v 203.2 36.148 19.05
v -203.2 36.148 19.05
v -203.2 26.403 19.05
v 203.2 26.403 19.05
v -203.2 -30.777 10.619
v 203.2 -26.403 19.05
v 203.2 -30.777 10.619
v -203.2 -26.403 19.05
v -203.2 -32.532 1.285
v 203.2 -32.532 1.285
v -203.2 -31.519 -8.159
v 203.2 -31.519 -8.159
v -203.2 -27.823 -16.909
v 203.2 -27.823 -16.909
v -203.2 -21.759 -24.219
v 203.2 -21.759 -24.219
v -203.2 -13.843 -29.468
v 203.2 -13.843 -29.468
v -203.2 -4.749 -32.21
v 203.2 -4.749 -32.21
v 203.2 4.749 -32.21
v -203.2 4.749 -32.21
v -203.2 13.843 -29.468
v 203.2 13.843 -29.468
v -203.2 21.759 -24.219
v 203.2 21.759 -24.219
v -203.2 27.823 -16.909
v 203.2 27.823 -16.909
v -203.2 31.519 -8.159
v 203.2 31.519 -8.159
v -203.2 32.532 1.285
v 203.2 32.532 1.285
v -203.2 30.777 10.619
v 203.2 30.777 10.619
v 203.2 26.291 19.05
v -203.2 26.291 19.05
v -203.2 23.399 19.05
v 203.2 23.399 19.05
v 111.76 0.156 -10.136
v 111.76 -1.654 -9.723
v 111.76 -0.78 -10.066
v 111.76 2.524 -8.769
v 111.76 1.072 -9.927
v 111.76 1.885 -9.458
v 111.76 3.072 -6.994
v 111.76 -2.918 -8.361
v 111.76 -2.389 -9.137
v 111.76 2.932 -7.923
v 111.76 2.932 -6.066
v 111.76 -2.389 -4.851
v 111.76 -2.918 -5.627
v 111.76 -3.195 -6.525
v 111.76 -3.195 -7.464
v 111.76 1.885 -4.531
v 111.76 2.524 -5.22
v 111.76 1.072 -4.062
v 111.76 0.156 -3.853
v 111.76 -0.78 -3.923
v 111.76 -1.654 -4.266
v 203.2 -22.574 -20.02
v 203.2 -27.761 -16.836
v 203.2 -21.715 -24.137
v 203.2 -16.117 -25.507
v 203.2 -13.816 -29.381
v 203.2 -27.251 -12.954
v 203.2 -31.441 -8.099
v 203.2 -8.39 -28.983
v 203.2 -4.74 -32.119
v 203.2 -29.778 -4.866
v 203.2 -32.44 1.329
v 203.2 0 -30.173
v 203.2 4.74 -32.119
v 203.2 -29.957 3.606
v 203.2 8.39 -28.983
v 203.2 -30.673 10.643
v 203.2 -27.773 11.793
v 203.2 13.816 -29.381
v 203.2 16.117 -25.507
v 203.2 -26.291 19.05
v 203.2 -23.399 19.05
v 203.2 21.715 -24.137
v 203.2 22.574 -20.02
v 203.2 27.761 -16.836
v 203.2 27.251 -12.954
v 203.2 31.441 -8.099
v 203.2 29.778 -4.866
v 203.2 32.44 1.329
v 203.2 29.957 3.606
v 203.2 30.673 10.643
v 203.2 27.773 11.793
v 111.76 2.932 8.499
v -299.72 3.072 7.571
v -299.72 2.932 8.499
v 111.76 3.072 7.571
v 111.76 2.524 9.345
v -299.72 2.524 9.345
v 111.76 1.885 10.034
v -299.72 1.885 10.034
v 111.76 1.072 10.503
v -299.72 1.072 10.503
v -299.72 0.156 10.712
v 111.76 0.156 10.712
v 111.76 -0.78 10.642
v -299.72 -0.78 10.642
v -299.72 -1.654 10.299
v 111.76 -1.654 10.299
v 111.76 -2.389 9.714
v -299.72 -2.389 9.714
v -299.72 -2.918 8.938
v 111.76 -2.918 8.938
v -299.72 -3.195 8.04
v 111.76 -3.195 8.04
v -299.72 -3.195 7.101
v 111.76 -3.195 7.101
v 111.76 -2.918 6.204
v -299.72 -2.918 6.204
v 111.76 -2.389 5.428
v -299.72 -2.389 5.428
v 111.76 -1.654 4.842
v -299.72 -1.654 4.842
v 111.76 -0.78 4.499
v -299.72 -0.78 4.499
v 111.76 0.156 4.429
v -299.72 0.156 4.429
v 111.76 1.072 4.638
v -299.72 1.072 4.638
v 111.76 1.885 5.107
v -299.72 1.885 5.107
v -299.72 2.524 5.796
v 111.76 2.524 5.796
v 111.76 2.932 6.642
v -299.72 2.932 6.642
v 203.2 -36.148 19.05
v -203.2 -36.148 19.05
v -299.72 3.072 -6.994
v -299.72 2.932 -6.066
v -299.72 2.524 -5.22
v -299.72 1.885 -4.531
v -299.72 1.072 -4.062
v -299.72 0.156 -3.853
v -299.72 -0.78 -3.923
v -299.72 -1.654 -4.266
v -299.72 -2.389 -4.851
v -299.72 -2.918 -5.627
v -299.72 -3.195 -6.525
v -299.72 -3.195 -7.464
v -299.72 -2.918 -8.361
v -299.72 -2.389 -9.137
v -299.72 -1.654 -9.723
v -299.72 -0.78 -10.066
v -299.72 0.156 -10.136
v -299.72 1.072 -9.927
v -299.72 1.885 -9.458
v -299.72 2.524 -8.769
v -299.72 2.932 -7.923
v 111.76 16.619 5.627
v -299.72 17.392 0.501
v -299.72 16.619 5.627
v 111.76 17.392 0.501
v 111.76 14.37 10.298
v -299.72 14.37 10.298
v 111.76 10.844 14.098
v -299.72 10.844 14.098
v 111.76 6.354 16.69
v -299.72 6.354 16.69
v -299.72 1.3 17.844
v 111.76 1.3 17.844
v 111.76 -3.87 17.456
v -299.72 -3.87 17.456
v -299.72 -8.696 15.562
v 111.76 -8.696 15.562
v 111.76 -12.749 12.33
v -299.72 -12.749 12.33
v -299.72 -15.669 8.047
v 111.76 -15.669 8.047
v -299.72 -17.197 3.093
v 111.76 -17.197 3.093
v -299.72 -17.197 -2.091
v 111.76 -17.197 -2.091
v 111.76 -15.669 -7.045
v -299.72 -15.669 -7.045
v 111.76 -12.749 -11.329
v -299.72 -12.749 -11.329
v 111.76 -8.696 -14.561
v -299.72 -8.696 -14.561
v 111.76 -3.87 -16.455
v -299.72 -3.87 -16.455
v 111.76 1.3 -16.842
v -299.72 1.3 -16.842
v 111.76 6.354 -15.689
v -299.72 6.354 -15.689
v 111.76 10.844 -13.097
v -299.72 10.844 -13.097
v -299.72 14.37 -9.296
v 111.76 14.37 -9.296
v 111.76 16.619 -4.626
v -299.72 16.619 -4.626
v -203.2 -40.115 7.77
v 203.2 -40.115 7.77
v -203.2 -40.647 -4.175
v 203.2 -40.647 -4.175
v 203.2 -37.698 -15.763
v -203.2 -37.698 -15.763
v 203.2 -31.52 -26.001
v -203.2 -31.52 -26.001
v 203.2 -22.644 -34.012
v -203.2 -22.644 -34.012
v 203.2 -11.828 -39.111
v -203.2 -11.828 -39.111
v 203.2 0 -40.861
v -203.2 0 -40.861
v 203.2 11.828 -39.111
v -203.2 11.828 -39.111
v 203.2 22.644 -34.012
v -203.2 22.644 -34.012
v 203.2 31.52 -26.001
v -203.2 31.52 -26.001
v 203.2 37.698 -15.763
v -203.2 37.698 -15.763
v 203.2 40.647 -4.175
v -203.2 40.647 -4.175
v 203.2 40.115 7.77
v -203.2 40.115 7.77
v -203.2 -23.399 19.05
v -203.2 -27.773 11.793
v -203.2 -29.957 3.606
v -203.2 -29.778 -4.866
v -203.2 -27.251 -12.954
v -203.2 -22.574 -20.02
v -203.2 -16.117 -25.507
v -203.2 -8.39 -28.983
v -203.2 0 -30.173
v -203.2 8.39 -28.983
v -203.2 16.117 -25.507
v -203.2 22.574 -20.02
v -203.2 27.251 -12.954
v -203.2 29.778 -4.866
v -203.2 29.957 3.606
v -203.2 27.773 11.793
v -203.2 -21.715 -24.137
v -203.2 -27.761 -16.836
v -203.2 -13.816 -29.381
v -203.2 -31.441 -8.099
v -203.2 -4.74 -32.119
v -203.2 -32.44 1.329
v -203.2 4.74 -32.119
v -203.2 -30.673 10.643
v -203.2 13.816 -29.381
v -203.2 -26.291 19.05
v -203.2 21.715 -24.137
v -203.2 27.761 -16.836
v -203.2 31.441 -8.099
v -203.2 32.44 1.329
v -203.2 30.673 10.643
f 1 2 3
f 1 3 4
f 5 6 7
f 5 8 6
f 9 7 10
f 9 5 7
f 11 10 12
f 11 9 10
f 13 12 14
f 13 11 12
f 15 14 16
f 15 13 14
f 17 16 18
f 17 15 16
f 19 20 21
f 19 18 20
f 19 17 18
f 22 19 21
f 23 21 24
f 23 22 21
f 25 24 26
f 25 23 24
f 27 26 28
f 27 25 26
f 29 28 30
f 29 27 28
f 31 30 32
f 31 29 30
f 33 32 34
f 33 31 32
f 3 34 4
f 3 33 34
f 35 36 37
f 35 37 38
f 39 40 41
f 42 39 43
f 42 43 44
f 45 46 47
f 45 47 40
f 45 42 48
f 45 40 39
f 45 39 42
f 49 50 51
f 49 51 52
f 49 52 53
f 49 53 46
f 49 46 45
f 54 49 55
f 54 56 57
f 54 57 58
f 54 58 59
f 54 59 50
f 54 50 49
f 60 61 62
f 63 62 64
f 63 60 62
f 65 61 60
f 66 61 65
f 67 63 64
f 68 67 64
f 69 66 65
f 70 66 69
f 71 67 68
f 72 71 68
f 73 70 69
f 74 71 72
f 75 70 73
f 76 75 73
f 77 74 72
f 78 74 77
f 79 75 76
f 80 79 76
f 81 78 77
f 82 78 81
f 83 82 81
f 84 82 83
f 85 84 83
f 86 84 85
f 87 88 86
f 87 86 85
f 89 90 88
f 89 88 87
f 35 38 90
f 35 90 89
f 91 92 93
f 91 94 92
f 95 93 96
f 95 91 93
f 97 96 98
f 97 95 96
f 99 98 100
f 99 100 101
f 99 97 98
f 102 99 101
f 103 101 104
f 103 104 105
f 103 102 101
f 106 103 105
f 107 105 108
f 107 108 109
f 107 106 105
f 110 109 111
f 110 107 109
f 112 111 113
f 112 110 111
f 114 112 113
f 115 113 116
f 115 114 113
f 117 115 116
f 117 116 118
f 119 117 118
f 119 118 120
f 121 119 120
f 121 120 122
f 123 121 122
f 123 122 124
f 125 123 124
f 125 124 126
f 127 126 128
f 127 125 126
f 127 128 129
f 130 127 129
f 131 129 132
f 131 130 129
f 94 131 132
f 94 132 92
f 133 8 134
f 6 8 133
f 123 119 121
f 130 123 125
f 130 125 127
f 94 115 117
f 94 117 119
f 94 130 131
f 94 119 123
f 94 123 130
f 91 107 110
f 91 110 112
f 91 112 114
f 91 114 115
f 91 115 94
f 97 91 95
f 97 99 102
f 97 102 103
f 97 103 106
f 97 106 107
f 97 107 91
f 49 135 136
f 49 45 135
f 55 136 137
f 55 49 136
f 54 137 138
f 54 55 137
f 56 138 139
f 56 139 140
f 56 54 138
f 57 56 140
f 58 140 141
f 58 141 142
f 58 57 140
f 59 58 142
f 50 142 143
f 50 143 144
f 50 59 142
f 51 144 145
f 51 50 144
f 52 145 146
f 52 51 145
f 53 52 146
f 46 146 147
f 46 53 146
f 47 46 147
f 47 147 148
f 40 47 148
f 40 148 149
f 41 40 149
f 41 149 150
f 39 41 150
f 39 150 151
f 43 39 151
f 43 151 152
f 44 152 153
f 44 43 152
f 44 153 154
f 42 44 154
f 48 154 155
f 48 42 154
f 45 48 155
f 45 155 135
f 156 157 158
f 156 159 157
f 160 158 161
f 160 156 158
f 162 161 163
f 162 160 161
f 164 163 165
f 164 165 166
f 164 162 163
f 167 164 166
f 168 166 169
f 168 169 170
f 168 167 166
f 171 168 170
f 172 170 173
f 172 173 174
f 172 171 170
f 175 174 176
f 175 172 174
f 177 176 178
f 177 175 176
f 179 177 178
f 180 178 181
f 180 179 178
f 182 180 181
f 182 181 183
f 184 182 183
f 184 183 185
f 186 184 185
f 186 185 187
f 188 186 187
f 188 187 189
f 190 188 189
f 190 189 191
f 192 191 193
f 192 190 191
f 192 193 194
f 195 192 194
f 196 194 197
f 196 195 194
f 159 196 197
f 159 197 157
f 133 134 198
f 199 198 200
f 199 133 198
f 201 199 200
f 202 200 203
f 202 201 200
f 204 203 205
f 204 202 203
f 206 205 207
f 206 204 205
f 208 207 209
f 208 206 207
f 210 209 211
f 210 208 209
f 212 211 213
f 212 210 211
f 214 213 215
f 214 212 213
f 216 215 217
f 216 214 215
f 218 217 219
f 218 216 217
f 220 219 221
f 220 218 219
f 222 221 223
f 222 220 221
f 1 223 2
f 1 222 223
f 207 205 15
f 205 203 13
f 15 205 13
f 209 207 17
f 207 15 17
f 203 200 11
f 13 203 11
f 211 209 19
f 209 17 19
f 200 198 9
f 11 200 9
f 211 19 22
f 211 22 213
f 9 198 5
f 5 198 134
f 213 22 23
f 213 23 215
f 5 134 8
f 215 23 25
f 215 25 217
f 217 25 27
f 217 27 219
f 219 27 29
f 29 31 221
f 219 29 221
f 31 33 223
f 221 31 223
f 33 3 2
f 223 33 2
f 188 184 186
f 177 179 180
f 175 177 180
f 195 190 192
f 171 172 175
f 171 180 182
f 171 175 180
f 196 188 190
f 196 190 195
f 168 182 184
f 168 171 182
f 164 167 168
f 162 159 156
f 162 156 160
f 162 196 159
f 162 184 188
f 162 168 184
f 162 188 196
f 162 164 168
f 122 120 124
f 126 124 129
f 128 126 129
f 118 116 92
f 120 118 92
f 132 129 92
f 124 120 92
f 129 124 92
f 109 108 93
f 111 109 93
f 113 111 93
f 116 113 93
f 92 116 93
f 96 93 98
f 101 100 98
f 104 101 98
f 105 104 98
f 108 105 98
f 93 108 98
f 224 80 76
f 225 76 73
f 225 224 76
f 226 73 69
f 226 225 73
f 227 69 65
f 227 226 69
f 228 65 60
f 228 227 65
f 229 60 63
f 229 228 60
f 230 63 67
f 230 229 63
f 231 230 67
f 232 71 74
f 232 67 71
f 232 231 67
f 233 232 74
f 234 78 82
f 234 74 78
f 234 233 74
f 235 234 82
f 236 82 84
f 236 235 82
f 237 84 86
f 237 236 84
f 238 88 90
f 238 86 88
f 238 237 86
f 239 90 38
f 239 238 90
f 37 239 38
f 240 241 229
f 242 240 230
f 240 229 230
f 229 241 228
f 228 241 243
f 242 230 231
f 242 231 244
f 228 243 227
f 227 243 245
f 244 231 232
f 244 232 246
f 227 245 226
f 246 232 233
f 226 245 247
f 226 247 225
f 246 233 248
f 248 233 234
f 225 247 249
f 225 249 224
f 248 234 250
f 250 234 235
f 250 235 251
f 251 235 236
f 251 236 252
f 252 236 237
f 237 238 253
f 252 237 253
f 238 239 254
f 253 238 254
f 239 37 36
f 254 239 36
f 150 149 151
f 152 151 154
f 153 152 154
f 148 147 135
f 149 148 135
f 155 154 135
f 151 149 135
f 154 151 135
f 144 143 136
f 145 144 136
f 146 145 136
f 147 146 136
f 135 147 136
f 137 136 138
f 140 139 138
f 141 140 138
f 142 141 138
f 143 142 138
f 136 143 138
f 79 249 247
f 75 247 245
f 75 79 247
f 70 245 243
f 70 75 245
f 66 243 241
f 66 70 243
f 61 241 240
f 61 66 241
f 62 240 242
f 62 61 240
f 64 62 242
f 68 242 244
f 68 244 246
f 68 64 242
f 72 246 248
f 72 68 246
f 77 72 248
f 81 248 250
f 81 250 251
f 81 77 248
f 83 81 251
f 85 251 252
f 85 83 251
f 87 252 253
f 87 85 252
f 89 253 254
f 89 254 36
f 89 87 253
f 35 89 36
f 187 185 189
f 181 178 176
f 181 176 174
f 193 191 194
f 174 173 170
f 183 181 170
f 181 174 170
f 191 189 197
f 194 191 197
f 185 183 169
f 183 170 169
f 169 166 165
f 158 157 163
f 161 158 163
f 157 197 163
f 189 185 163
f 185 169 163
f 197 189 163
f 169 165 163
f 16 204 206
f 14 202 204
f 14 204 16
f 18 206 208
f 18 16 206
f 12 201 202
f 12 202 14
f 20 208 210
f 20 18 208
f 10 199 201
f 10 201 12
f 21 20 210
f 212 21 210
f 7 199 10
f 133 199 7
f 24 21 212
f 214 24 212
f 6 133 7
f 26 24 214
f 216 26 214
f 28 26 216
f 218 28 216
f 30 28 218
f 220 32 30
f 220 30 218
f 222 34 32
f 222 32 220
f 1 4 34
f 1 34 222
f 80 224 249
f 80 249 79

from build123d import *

# Parameters (mm, degrees)
F0_R           = 32.467339
F0_R_2         = 30.172731
F1_DEPTH       = 203.2
F1_DEPTH_BACK  = 203.2
F2_R           = 40.860562
F2_R_2         = 32.557761
F3_DEPTH       = 203.2
F3_DEPTH_BACK  = 203.2
F4_R           = 3.150683
F5_DEPTH       = 111.76
F5_DEPTH_BACK  = 299.72
F7_W           = 426.029071
F7_H           = 92.935704
F8_DEPTH       = 35.814
F9_R           = 17.391696
F10_DEPTH      = 111.76
F10_DEPTH_BACK = 299.72


with BuildPart() as f1:
    # F0 (on Right) → F1 (new body, two sides)
    with BuildSketch(Plane.YZ) as f1_sk:
        Circle(F0_R)
        Circle(F0_R_2, mode=Mode.SUBTRACT)
    extrude(amount=F1_DEPTH)
    extrude(f1_sk.sketch, amount=-F1_DEPTH_BACK)


with BuildPart() as f3:
    # F2 (on Right) → F3 (new body, two sides)
    with BuildSketch(Plane.YZ) as f3_sk:
        Circle(F2_R)
        Circle(F2_R_2, mode=Mode.SUBTRACT)
    extrude(amount=F3_DEPTH)
    extrude(f3_sk.sketch, amount=-F3_DEPTH_BACK)


with BuildPart() as f5:
    # F4 (on Right) → F5 (new body, two sides)
    with BuildSketch(Plane.YZ) as f5_sk:
        with Locations((-0.079018, 7.570568)):
            Circle(F4_R)
        with Locations((-0.079018, -6.994453)):
            Circle(F4_R)
    extrude(amount=F5_DEPTH)
    extrude(f5_sk.sketch, amount=-F5_DEPTH_BACK)


with BuildPart() as f8_tool:
    # F7 (on offset) → F8 (new body)
    with BuildSketch(Plane.XY.offset(19.05)):
        with Locations((-1.902603, -0.868738)):
            Rectangle(F7_W, F7_H)
    extrude(amount=F8_DEPTH)


with BuildPart() as f1_1:
    add(f1.part)

    # F8: cut by f8_tool
    add(f8_tool.part, mode=Mode.SUBTRACT)


with BuildPart() as f3_1:
    add(f3.part)

    # F8: cut by f8_tool
    add(f8_tool.part, mode=Mode.SUBTRACT)


with BuildPart() as f10:
    # F9 (on Right) → F10 (new body, two sides)
    with BuildSketch(Plane.YZ) as f10_sk:
        with Locations((0, 0.500688)):
            Circle(F9_R)
    extrude(amount=F10_DEPTH)
    extrude(f10_sk.sketch, amount=-F10_DEPTH_BACK)


solid = Compound([f5.part, f1_1.part, f3_1.part, f10.part])
